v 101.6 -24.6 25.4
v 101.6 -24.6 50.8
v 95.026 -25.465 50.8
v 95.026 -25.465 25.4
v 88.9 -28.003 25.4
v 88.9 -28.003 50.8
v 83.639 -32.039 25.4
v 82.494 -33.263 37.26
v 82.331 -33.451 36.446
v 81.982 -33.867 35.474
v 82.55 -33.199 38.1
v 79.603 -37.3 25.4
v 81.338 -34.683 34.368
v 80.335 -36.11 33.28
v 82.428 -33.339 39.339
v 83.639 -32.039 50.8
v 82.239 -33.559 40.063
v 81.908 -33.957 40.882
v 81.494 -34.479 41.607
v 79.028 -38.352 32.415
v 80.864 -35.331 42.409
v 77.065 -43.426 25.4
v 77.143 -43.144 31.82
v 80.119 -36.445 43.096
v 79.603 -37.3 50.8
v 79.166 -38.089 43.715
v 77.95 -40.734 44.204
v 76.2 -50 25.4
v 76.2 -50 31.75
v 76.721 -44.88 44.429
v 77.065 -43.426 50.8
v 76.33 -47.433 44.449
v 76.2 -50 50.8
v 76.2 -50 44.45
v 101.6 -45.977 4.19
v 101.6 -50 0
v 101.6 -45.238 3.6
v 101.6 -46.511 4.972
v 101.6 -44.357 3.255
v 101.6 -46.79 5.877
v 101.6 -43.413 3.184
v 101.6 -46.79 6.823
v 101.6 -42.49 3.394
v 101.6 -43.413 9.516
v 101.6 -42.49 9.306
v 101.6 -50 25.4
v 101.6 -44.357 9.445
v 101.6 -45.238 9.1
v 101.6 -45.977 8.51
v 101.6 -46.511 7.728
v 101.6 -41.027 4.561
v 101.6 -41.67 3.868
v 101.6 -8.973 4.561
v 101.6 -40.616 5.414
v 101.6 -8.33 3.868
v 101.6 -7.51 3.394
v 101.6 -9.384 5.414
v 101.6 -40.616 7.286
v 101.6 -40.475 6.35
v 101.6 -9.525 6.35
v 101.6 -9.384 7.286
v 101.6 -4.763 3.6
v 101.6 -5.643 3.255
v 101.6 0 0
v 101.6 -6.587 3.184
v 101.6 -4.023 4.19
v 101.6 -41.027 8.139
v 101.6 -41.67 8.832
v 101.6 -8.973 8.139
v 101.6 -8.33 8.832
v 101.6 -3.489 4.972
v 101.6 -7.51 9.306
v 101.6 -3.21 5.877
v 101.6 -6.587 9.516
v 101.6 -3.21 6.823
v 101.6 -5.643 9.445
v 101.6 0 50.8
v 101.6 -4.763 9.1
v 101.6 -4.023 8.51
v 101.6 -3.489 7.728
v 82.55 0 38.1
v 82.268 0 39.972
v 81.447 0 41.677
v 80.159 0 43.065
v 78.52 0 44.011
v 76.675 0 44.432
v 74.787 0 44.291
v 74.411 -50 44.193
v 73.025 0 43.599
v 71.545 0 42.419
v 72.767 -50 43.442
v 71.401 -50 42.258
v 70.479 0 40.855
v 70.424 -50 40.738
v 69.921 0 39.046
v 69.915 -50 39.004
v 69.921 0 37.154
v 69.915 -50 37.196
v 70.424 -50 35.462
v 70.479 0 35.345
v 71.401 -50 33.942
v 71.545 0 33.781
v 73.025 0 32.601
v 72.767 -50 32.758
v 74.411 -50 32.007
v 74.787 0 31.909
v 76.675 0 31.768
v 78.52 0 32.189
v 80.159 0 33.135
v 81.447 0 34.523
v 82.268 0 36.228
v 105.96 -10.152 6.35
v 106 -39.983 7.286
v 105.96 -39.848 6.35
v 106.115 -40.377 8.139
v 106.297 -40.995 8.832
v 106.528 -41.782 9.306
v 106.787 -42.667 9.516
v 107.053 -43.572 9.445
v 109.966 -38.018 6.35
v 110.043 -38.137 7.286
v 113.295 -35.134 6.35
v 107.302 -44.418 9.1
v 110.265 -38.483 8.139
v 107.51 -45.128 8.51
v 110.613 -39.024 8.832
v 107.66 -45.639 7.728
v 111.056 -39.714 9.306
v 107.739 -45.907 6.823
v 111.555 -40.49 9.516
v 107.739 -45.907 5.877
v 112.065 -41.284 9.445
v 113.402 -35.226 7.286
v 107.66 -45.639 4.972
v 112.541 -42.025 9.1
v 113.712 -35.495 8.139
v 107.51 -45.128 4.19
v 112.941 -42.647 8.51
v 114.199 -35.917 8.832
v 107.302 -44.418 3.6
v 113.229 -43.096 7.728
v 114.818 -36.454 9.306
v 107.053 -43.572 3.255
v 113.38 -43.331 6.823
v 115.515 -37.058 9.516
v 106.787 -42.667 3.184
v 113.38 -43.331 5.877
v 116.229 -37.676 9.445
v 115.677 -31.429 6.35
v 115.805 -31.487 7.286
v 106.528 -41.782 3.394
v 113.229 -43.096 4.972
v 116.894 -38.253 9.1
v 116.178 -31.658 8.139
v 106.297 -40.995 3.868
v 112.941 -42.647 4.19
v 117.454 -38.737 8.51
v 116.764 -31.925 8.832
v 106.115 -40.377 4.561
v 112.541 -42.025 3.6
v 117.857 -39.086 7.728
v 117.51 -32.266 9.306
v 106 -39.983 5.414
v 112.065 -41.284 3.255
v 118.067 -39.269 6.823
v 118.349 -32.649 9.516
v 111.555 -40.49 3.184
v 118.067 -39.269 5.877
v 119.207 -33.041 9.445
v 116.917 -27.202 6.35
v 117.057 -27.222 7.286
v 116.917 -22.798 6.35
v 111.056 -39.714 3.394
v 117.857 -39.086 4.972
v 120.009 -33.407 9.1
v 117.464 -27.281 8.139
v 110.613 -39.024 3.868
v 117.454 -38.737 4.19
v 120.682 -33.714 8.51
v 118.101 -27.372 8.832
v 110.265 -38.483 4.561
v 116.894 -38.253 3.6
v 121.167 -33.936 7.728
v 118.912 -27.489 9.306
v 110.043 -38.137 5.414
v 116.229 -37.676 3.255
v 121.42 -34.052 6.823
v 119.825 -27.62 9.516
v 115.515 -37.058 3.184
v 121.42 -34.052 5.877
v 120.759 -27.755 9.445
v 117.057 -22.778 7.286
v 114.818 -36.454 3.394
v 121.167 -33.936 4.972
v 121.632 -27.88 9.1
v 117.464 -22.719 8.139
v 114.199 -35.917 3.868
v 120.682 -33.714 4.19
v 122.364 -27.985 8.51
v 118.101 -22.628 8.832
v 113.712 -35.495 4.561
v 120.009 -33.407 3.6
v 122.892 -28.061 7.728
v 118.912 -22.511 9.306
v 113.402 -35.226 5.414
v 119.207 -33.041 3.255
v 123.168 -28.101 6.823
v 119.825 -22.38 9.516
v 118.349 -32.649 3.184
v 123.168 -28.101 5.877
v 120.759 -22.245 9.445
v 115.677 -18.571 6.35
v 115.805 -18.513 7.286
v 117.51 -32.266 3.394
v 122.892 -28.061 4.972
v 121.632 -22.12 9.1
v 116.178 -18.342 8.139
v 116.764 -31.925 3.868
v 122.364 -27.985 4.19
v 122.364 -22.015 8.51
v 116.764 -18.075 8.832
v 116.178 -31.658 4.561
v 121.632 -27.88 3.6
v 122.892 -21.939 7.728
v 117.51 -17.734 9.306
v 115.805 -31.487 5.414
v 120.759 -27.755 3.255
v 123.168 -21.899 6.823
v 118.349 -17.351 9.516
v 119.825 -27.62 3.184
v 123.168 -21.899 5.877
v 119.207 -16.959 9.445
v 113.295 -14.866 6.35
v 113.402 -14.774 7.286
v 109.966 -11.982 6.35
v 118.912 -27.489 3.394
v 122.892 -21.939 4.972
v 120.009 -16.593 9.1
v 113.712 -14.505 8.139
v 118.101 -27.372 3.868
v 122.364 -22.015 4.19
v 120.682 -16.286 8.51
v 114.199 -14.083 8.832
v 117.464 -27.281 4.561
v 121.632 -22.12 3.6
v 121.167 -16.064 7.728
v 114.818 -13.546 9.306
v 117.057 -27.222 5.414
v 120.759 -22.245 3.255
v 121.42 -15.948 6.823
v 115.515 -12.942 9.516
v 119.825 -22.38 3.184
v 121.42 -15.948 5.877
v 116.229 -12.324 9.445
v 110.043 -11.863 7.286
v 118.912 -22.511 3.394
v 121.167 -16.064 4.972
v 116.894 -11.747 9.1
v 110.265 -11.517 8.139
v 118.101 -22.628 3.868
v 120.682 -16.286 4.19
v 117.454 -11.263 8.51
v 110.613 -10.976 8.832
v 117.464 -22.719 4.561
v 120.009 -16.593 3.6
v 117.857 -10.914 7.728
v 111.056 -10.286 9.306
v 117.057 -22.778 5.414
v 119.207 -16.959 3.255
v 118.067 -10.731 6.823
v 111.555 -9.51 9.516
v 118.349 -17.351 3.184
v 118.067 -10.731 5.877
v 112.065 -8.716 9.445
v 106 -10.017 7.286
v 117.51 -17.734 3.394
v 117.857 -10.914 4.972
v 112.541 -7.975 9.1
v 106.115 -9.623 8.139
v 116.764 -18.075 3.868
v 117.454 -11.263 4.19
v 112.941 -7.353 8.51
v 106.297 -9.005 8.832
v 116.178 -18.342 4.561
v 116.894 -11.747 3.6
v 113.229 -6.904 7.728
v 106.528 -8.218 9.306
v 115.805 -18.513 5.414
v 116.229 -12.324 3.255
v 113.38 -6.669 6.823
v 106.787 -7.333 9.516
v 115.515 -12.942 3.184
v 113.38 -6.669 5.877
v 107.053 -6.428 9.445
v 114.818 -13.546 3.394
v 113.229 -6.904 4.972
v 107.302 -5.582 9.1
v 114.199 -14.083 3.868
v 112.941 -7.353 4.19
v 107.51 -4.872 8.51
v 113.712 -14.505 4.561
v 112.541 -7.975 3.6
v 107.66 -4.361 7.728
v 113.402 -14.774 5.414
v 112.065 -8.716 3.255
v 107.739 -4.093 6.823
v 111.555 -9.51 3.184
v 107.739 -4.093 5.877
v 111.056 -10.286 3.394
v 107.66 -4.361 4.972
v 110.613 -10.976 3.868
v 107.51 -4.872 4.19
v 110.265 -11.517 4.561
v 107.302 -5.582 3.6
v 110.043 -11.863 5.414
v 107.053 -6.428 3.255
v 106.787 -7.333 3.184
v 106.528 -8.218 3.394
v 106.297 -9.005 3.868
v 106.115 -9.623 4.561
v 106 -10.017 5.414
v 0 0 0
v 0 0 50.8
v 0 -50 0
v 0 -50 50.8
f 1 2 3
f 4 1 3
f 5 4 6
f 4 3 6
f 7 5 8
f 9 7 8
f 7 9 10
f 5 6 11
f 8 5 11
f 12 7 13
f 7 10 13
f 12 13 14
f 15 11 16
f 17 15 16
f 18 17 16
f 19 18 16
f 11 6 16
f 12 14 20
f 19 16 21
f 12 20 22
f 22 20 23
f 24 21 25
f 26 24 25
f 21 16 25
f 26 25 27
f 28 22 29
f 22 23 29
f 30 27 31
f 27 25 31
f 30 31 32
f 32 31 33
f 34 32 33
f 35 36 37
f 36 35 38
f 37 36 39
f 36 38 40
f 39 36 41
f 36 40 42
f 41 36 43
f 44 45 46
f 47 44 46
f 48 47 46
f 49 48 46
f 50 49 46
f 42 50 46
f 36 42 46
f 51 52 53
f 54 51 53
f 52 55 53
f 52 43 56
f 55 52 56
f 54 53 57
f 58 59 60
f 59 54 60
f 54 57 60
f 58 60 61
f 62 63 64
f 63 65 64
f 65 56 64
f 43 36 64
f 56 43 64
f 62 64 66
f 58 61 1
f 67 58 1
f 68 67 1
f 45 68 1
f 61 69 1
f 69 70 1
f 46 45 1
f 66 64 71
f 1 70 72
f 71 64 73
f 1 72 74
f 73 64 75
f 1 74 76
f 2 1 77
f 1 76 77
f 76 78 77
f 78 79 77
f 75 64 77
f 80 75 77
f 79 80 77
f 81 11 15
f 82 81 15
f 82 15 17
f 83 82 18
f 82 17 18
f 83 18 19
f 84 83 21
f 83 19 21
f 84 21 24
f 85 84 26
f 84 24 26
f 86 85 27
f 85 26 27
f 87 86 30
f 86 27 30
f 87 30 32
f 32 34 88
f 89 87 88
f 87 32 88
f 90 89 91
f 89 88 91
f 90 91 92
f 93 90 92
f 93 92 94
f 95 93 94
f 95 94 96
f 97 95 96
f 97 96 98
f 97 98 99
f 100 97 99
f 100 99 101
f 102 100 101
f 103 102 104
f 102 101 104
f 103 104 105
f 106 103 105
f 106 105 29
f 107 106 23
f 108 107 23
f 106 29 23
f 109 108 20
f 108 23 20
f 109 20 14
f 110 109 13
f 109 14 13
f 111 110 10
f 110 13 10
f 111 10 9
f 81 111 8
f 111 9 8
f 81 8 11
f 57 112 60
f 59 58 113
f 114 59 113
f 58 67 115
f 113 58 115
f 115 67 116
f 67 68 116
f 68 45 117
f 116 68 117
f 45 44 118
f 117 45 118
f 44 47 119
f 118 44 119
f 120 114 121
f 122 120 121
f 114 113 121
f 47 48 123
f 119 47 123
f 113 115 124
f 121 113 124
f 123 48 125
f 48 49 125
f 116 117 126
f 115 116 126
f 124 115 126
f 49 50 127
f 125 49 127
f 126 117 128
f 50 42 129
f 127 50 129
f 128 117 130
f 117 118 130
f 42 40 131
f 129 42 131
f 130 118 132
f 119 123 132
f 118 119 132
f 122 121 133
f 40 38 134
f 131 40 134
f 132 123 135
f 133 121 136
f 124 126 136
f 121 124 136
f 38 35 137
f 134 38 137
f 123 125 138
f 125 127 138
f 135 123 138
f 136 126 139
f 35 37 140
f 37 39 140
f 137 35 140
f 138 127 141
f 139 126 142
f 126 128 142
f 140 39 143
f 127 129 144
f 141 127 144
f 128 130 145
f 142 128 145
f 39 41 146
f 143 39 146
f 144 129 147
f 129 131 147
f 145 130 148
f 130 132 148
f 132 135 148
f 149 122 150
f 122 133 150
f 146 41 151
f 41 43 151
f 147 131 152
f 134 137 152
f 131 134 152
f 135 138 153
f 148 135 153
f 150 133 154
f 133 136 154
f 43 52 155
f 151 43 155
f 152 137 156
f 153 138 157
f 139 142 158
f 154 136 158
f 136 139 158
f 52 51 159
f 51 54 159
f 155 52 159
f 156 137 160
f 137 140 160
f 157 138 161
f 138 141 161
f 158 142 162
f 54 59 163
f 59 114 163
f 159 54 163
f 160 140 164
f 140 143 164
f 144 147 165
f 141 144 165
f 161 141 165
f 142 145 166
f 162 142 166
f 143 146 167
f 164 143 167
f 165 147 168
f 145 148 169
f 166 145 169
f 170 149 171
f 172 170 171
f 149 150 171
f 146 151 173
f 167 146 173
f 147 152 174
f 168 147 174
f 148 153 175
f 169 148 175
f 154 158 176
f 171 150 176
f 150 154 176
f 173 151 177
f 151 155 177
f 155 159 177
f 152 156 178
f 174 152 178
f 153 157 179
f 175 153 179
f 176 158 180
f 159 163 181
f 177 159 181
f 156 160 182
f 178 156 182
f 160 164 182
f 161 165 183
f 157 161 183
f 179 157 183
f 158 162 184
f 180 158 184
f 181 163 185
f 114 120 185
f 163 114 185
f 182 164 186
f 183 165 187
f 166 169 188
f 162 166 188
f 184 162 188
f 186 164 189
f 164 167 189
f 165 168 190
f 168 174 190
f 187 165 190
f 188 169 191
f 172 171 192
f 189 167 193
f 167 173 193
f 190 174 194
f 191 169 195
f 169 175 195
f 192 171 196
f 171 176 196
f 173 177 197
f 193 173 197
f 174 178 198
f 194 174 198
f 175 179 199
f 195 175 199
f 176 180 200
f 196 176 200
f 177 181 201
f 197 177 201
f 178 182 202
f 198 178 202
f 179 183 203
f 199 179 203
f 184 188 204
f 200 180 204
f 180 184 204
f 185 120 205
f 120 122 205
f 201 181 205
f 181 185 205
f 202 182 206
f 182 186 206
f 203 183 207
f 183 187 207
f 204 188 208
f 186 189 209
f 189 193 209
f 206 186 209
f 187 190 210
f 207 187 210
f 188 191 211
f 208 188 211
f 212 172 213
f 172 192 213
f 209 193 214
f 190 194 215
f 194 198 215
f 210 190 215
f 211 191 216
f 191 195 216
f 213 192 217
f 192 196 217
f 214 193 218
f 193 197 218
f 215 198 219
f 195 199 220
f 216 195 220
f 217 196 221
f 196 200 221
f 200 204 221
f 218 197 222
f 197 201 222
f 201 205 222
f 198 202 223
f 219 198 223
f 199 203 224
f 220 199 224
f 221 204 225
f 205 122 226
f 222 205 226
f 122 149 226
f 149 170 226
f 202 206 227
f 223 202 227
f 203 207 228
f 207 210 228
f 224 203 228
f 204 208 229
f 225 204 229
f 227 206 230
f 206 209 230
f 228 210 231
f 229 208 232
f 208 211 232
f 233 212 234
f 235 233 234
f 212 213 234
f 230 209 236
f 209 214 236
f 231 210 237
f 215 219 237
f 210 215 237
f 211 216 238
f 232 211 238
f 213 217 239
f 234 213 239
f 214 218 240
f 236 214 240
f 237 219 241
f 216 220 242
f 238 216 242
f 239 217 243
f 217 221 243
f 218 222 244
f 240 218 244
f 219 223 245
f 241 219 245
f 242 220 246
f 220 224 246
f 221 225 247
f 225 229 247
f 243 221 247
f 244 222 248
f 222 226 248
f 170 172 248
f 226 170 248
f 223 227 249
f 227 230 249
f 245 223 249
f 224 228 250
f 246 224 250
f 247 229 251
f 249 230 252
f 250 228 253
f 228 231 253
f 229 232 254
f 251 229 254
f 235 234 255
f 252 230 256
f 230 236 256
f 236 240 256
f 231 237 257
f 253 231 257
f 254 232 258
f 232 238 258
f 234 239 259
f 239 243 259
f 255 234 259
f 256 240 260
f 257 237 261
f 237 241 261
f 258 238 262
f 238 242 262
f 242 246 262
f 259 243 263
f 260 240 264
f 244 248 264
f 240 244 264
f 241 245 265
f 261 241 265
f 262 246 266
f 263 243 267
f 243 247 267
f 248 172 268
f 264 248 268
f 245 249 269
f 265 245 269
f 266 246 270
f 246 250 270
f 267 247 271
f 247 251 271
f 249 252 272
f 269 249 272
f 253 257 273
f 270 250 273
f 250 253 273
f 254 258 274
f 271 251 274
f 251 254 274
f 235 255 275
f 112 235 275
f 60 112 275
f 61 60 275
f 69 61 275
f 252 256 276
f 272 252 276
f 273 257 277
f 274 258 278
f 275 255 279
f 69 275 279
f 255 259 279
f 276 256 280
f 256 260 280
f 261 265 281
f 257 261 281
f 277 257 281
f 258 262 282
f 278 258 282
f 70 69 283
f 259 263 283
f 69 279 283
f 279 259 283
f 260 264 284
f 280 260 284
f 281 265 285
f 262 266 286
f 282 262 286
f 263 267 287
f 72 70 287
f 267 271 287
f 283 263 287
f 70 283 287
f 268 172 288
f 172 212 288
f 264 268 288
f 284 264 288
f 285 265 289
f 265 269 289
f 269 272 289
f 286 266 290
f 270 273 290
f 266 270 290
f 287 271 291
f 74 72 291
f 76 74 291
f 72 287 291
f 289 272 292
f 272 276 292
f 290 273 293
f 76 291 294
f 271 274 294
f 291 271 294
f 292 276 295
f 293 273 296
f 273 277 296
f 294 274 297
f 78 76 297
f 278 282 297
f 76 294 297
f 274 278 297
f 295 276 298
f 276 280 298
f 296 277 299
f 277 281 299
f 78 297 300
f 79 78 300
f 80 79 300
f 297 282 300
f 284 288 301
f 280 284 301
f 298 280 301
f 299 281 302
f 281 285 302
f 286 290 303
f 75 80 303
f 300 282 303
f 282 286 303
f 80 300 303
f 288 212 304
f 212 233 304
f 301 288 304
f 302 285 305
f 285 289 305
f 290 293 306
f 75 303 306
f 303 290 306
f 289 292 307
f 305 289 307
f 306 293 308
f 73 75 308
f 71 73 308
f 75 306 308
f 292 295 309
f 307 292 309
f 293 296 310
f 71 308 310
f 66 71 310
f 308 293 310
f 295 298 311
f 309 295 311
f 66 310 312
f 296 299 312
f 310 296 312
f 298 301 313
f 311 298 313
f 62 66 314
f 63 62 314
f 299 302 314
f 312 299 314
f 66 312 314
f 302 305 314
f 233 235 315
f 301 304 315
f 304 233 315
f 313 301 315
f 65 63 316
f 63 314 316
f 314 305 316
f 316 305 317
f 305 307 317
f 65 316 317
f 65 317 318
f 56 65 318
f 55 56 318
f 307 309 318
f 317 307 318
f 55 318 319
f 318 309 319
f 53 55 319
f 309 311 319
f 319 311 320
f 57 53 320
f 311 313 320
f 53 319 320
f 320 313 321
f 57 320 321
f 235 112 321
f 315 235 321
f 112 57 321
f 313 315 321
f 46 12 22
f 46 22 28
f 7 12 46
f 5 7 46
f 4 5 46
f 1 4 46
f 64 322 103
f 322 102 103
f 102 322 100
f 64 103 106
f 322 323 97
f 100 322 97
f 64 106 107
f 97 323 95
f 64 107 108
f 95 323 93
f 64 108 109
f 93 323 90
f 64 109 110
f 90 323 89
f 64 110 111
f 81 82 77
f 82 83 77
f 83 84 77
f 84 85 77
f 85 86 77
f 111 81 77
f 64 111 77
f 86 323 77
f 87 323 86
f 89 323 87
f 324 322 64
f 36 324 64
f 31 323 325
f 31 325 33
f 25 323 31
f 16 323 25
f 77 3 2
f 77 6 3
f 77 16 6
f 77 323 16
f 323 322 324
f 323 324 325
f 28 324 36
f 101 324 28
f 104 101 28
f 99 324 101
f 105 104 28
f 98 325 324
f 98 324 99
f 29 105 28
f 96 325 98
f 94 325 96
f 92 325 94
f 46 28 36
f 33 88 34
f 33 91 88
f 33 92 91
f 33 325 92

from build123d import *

# Parameters (mm, degrees)
F0_W     = 101.6
F0_H     = 50.8
F1_DEPTH = 50
F3_DEPTH = 25.4
F4_R     = 6.35
F5_DEPTH = 50.001
F6_R     = 3.175


with BuildPart() as f1:
    # F0 (on Front) → F1 (new body)
    with BuildSketch(Plane.XZ):
        with Locations((50.8, 25.4)):
            Rectangle(F0_W, F0_H)
    extrude(amount=F1_DEPTH)

    # F2 (on face) → F3 (cut)
    with BuildSketch(Plane.XY.offset(50.8)):
        with BuildLine():
            Line((101.6, -50), (101.6, -24.6))
            ThreePointArc((101.6, -24.6), (83.6394877579, -32.0394877579), (76.2, -50))
            Line((76.2, -50), (101.6, -50))
        make_face()
        with BuildLine():
            ThreePointArc((76.2, -50), (101.6, -75.4), (127, -50))
            ThreePointArc((127, -50), (119.5605122421, -32.0394877579), (101.6, -24.6))
            Line((101.6, -24.6), (101.6, -50))
            Line((101.6, -50), (76.2, -50))
        make_face()
    extrude(amount=-F3_DEPTH, mode=Mode.SUBTRACT)

    # F4 (on face) → F5 (cut, through all)
    with BuildSketch(Plane.XZ.offset(50)):
        with Locations((76.2, 38.1)):
            Circle(F4_R)
    extrude(amount=-F5_DEPTH, mode=Mode.SUBTRACT)

    # F6 (on face) → F7 (revolve)
    with BuildSketch(Plane.YZ.offset(101.6)):
        with Locations((-43.65, 6.35)):
            Circle(F6_R)
    revolve(axis=Axis((101.6, -25, 6.2950919382), (0, 0, 1)))


solid = f1.part
